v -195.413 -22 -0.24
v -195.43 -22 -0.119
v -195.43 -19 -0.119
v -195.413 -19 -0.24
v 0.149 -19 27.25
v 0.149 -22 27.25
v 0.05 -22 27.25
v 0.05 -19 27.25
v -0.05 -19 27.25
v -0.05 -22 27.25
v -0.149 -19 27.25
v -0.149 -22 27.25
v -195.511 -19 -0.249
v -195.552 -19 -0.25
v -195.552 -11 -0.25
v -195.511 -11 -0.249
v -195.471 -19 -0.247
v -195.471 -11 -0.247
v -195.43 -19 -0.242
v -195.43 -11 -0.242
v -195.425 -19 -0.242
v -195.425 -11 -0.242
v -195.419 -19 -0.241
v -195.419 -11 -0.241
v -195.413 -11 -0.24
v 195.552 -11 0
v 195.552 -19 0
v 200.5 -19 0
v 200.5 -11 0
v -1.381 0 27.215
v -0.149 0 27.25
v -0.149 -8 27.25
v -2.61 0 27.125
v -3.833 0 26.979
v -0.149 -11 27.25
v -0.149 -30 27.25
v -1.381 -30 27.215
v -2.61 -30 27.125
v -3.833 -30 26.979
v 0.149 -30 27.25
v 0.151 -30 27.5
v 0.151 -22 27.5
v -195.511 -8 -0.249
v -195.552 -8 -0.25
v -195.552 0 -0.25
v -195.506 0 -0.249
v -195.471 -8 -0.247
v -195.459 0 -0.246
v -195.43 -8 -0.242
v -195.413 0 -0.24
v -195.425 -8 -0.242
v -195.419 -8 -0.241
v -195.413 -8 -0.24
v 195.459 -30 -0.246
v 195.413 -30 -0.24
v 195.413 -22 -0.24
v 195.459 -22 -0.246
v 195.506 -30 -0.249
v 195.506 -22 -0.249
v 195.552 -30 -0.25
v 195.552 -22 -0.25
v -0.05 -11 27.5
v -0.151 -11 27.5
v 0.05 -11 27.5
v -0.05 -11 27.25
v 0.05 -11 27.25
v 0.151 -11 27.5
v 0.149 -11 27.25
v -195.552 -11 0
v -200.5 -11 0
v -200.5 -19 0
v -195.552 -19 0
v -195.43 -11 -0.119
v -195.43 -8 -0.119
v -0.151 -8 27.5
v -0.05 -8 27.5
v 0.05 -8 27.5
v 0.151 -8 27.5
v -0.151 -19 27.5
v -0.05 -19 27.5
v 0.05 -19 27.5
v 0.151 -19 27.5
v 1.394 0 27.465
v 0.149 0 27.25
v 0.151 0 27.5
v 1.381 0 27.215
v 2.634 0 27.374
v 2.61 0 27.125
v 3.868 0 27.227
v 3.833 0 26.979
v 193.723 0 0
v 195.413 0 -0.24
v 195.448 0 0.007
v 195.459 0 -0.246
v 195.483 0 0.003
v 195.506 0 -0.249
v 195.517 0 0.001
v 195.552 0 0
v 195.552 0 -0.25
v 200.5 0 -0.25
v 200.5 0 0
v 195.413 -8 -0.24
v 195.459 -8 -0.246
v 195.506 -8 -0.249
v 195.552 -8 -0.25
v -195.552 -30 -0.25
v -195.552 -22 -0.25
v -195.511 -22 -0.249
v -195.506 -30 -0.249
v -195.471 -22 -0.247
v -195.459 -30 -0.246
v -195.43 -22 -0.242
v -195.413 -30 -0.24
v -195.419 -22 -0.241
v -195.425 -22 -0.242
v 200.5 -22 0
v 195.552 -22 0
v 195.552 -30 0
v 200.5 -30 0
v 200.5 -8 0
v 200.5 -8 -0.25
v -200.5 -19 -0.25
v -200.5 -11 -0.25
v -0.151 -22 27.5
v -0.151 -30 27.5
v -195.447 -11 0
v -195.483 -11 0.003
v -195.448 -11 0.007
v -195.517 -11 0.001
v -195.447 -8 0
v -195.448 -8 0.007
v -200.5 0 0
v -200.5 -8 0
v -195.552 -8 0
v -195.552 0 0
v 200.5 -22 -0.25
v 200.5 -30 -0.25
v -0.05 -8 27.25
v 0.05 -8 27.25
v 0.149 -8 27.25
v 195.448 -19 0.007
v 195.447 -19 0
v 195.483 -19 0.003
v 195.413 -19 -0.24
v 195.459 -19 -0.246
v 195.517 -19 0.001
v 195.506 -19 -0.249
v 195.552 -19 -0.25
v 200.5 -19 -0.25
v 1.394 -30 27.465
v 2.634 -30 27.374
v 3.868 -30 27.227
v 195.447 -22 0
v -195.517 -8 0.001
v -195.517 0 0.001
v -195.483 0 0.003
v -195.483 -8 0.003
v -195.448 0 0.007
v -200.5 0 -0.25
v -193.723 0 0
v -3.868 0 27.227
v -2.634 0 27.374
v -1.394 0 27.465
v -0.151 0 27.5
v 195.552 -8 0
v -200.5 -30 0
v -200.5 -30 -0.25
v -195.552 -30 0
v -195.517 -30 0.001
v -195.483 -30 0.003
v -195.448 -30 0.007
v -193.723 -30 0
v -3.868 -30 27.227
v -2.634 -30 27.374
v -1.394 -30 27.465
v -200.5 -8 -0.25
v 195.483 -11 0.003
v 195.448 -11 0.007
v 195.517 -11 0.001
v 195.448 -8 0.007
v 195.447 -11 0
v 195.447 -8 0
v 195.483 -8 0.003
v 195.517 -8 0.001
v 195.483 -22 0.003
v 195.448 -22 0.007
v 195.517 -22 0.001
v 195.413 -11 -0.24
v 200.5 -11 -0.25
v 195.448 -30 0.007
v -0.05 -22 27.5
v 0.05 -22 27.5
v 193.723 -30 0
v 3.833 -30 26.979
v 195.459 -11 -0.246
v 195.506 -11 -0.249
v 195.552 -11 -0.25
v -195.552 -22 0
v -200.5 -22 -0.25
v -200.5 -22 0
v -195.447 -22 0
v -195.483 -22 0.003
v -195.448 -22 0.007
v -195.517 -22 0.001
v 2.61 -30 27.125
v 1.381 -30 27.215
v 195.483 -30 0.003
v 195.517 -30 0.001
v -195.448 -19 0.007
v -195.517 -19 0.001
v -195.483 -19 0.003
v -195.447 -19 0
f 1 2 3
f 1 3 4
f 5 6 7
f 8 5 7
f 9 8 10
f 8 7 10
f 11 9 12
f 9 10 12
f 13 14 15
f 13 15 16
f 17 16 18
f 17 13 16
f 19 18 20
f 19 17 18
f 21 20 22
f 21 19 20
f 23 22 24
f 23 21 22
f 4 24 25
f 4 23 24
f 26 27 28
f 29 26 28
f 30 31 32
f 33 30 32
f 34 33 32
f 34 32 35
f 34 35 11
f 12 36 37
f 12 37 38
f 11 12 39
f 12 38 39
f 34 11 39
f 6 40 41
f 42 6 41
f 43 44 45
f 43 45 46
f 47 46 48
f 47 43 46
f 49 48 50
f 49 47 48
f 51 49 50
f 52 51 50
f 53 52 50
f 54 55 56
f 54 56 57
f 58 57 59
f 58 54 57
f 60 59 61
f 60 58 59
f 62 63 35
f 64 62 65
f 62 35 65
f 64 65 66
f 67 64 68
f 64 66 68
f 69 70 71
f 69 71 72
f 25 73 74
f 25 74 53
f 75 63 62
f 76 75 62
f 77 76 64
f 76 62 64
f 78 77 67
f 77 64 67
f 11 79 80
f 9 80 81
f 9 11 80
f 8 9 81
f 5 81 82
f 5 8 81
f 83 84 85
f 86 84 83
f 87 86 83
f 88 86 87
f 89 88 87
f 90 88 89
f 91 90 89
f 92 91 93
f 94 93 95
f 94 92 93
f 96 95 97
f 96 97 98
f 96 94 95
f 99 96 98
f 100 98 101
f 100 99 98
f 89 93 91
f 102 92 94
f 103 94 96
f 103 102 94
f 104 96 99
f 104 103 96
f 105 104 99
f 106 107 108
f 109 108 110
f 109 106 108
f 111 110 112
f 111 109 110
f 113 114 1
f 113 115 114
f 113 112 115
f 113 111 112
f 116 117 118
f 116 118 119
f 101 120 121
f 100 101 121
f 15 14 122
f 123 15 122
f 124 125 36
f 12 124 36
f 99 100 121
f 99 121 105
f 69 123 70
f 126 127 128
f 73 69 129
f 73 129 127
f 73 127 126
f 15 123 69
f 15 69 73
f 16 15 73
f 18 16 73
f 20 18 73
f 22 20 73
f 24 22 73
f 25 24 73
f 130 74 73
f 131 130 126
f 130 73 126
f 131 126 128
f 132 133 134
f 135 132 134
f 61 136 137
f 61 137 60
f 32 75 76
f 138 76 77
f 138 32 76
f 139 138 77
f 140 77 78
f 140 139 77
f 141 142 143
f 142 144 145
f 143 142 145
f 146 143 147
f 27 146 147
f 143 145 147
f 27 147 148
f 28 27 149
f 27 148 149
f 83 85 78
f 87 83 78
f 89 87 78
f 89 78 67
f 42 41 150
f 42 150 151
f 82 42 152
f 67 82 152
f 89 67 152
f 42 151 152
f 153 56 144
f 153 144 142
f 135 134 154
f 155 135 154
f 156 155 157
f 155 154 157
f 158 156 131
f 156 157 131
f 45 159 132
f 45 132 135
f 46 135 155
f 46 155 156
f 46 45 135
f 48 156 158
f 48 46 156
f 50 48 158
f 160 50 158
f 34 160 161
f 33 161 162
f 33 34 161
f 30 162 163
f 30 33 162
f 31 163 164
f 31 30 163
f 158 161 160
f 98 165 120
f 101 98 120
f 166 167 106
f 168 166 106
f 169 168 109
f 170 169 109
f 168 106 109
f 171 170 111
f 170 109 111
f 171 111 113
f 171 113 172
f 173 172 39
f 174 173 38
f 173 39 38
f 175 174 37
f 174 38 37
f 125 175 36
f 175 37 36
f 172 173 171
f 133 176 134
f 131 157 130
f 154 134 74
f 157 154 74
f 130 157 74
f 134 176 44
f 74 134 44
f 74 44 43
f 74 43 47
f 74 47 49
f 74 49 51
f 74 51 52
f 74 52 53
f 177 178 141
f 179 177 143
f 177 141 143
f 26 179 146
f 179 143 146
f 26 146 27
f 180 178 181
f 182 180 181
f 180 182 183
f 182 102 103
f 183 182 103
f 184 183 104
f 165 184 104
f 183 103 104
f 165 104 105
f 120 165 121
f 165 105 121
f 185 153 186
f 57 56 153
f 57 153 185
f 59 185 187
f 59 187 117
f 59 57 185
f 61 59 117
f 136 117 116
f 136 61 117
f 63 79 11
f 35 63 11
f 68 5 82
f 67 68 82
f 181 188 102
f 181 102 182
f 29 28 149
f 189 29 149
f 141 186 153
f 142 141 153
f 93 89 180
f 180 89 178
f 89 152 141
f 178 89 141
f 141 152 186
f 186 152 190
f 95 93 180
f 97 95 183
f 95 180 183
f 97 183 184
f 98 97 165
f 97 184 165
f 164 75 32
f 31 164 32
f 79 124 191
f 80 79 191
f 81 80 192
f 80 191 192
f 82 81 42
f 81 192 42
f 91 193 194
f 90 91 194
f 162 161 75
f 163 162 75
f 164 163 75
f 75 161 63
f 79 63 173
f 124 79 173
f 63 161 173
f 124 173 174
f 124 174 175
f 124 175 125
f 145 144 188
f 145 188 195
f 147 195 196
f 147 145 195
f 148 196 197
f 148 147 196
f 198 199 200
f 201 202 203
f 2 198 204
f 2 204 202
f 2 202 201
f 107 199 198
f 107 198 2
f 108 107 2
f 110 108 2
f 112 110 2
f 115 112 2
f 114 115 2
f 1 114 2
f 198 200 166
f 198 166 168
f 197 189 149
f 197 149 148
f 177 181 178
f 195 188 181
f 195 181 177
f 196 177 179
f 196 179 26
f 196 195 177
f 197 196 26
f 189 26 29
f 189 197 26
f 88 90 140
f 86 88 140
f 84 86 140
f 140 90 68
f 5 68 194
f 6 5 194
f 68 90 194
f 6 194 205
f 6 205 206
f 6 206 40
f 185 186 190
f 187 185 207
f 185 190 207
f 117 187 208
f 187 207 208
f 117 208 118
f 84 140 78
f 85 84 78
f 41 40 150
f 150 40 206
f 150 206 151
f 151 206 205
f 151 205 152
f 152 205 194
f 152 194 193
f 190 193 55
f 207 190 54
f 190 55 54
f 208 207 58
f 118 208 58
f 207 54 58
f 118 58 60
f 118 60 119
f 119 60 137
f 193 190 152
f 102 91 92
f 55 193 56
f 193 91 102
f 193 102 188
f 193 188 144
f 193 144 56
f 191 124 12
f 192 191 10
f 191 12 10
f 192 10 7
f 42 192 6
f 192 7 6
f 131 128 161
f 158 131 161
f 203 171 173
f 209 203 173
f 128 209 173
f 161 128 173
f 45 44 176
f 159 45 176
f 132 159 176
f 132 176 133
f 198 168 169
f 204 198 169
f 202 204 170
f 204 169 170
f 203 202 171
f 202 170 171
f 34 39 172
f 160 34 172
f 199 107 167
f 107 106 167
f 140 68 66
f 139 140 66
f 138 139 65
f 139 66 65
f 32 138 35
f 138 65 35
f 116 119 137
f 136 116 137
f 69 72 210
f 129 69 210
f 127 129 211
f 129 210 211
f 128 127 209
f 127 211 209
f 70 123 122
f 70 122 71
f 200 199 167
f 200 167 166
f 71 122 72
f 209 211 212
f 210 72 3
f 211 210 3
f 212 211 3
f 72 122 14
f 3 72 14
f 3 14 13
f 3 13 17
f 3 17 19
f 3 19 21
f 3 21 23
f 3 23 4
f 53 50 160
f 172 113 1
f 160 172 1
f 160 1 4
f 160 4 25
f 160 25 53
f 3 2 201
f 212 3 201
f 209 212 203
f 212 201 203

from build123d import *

# Parameters (mm, degrees)
BASE_FLANGE1_DEPTH  = 50
UNFOLD1_START       = -50
UNFOLD1_DEPTH       = 50
UNFOLD1_2_OUTLINE_W = 3.874357202
UNFOLD1_2_OUTLINE_H = 0.25
UNFOLD1_2_DEPTH     = 50
CUT_EXTRUDE2_DEPTH  = 211.401854511
SKETCH6_W           = 5.069534468
SKETCH6_H           = 3
CUT_EXTRUDE3_DEPTH  = 211.401854511
LPATTERN2_COUNT     = 2
LPATTERN2_PITCH     = 11
SKETCH8_W           = 0.3
SKETCH8_H           = 8
CUT_EXTRUDE4_DEPTH  = 211.401854511
LPATTERN3_COUNT     = 5
LPATTERN3_PITCH     = 11
SKETCH9_W           = 404.874357202
SKETCH9_H           = 46.767764052
CUT_EXTRUDE5_DEPTH  = 211.398245103
FOLD1_START         = -30
FOLD1_OUTLINE_W     = 3.874357202
FOLD1_OUTLINE_H     = 0.25
FOLD1_DEPTH         = 30
FOLD1_START_2       = -22
FOLD1_2_DEPTH       = 3
FOLD1_START_3       = -11
FOLD1_3_DEPTH       = 3
FOLD1_4_DEPTH       = 30
FOLD1_5_DEPTH       = 3
FOLD1_6_DEPTH       = 3
FOLD1_7_DEPTH       = 8
FOLD1_START_4       = -19
FOLD1_8_DEPTH       = 8
FOLD1_START_5       = -8
FOLD1_9_DEPTH       = 8


# Read off the part's stored shape, not the designer's step: Unfold1, Fold1
# Sheet-metal steps are written as plain solids
with BuildPart() as part:
    # Sketch1 → Base-Flange1 (new body)
    with BuildSketch(Plane(origin=(0, 0, 0), x_dir=(1, 0, 0), z_dir=(0, 1, 0))):
        with BuildLine():
            Line((-200.5, 0), (-195.552065744, 0))
            ThreePointArc((-195.552065744, 0), (-195.50012958, -0.001833238), (-195.448451933, -0.007323826))
            Line((-195.448451933, -0.007323826), (-3.868286445, -27.226574518))
            ThreePointArc((-3.868286445, -27.226574518), (0, -27.5), (3.868286445, -27.226574518))
            Line((3.868286445, -27.226574518), (195.448451933, -0.007323826))
            ThreePointArc((195.448451933, -0.007323826), (195.50012958, -0.001833238), (195.552065744, 0))
            Line((195.552065744, 0), (200.5, 0))
            Line((200.5, 0), (200.5, 0.25))
            Line((200.5, 0.25), (195.552065744, 0.25))
            ThreePointArc((195.552065744, 0.25), (195.48250259, 0.247544566), (195.413285693, 0.240190488))
            Line((195.413285692, 0.240190488), (3.833120205, -26.979060204))
            ThreePointArc((3.833120205, -26.979060204), (0, -27.25), (-3.833120205, -26.979060204))
            Line((-3.833120205, -26.979060204), (-195.413285692, 0.240190488))
            ThreePointArc((-195.413285692, 0.240190488), (-195.48250259, 0.247544566), (-195.552065743, 0.25))
            Line((-195.552065744, 0.25), (-200.5, 0.25))
            Line((-200.5, 0.25), (-200.5, 0))
        make_face()
    extrude(amount=-BASE_FLANGE1_DEPTH)

    # Unfold1 outline → Unfold1 (cut)
    with BuildSketch(Plane(origin=(0, 0, 0), x_dir=(1, 0, 0), z_dir=(0, 1, 0)).offset(UNFOLD1_START)):
        with BuildLine():
            Line((195.552065744, 0), (193.722727272, 0))
            Line((193.722727272, 0), (3.833120205, -26.979060204))
            ThreePointArc((3.833120205, -26.979060204), (0, -27.25), (-3.833120205, -26.979060204))
            Line((-3.833120205, -26.979060204), (-193.722727272, 0))
            Line((-193.722727272, 0), (-195.552065744, 0))
            ThreePointArc((-195.552065744, 0), (-195.500129581, -0.001833238), (-195.448451933, -0.007323826))
            Line((-195.448451933, -0.007323826), (-3.868286445, -27.226574518))
            ThreePointArc((-3.868286445, -27.226574518), (0, -27.5), (3.868286445, -27.226574518))
            Line((3.868286445, -27.226574518), (195.448451933, -0.007323826))
            ThreePointArc((195.448451933, -0.007323826), (195.500129581, -0.001833238), (195.552065744, 0))
        make_face()
    extrude(amount=UNFOLD1_DEPTH, mode=Mode.SUBTRACT)

    # Unfold1 2 outline → Unfold1 2 (add)
    with BuildSketch(Plane(origin=(0, 0, 0), x_dir=(1, 0, 0), z_dir=(0, 1, 0)).offset(UNFOLD1_START)):
        with BuildLine():
            ThreePointArc((195.413285692, 0.240190488), (195.48250259, 0.247544566), (195.552065744, 0.25))
            Line((195.552065744, 0.25), (-195.552065744, 0.25))
            ThreePointArc((-195.552065744, 0.25), (-195.48250259, 0.247544566), (-195.413285692, 0.240190488))
            Line((-195.413285692, 0.240190488), (-193.722727272, 0))
            Line((-193.722727272, 0), (193.722727272, 0))
            Line((193.722727272, 0), (195.413285692, 0.240190488))
        make_face()
        with Locations((202.437178601, 0.125)):
            Rectangle(UNFOLD1_2_OUTLINE_W, UNFOLD1_2_OUTLINE_H)
    extrude(amount=UNFOLD1_2_DEPTH)

    # Sketch7 → Cut-Extrude2 (cut, through all)
    with BuildSketch(Plane.XY):
        Polygon((-200.5, -30), (-195.552065744, -30), (1.937178601, -50), (199.304822734, -30), (204.374357202, -30), (227.072555567, -34.066984848), (175.364463115, -76.287353915), (-151.111703925, -76.287353915), (-215.740676819, -64.707357595), align=None)
    extrude(amount=-CUT_EXTRUDE2_DEPTH, mode=Mode.SUBTRACT)

    # Sketch6 → Cut-Extrude3 (cut, through all)
    with BuildSketch(Plane.XY):
        with Locations((-197.965232766, -9.5)):
            Rectangle(SKETCH6_W, SKETCH6_H)
        with Locations((201.839589968, -9.5)):
            Rectangle(SKETCH6_W, SKETCH6_H)
    cut_extrude3 = extrude(amount=-CUT_EXTRUDE3_DEPTH, mode=Mode.SUBTRACT)

    # LPattern2: Cut-Extrude3 ×2
    with Locations(*[(0, -i * LPATTERN2_PITCH, 0) for i in range(1, LPATTERN2_COUNT)]):
        add(cut_extrude3, mode=Mode.SUBTRACT)

    # Sketch8 → Cut-Extrude4 (cut, through all)
    with BuildSketch(Plane.XY):
        with Locations((1.937178601, -4)):
            Rectangle(SKETCH8_W, SKETCH8_H)
    cut_extrude4 = extrude(amount=-CUT_EXTRUDE4_DEPTH, mode=Mode.SUBTRACT)

    # LPattern3: Cut-Extrude4 ×5
    with Locations(*[(0, -i * LPATTERN3_PITCH, 0) for i in range(1, LPATTERN3_COUNT)]):
        add(cut_extrude4, mode=Mode.SUBTRACT)

    # Sketch9 → Cut-Extrude5 (cut, through all)
    with BuildSketch(Plane.XY):
        with Locations((1.937178601, -53.383882026)):
            Rectangle(SKETCH9_W, SKETCH9_H)
    extrude(amount=-CUT_EXTRUDE5_DEPTH, mode=Mode.SUBTRACT)

    # Fold1 outline → Fold1 (cut)
    with BuildSketch(Plane(origin=(0, 0, 0), x_dir=(1, 0, 0), z_dir=(0, 1, 0)).offset(FOLD1_START)):
        with BuildLine():
            Line((193.722727272, 0), (195.413285692, 0.240190488))
            ThreePointArc((195.413285692, 0.240190488), (195.48250259, 0.247544566), (195.552065744, 0.25))
            Line((195.552065744, 0.25), (-195.552065744, 0.25))
            ThreePointArc((-195.552065744, 0.25), (-195.48250259, 0.247544566), (-195.413285692, 0.240190488))
            Line((-195.413285692, 0.240190488), (-193.722727272, 0))
            Line((-193.722727272, 0), (193.722727272, 0))
        make_face()
        with Locations((202.437178601, 0.125)):
            Rectangle(FOLD1_OUTLINE_W, FOLD1_OUTLINE_H)
    extrude(amount=FOLD1_DEPTH, mode=Mode.SUBTRACT)

    # Fold1 2 outline → Fold1 2 (cut)
    with BuildSketch(Plane(origin=(0, 0, 0), x_dir=(1, 0, 0), z_dir=(0, 1, 0)).offset(FOLD1_START_2)):
        with BuildLine():
            ThreePointArc((195.552065744, 0.25), (195.48250259, 0.247544566), (195.413285692, 0.240190488))
            Line((195.413285692, 0.240190488), (195.447411381, 0))
            Line((195.447411381, 0), (199.304822734, 0))
            Line((199.304822734, 0), (199.304822734, 0.25))
            Line((199.304822734, 0.25), (195.552065744, 0.25))
        make_face()
        with BuildLine():
            Line((-195.430465532, 0.119271783), (-195.413285692, 0.240190488))
            ThreePointArc((-195.413285692, 0.240190488), (-195.42187059, 0.241371769), (-195.430465532, 0.242477601))
            Line((-195.430465532, 0.242477601), (-195.430465532, 0.119271783))
        make_face()
    extrude(amount=FOLD1_2_DEPTH, mode=Mode.SUBTRACT)

    # Fold1 3 outline → Fold1 3 (cut)
    with BuildSketch(Plane(origin=(0, 0, 0), x_dir=(1, 0, 0), z_dir=(0, 1, 0)).offset(FOLD1_START_3)):
        with BuildLine():
            ThreePointArc((195.552065744, 0.25), (195.48250259, 0.247544566), (195.413285692, 0.240190488))
            Line((195.413285692, 0.240190488), (195.447411381, 0))
            Line((195.447411381, 0), (199.304822734, 0))
            Line((199.304822734, 0), (199.304822734, 0.25))
            Line((199.304822734, 0.25), (195.552065744, 0.25))
        make_face()
        with BuildLine():
            Line((-195.430465532, 0.119271783), (-195.413285692, 0.240190488))
            ThreePointArc((-195.413285692, 0.240190488), (-195.42187059, 0.241371769), (-195.430465532, 0.242477601))
            Line((-195.430465532, 0.242477601), (-195.430465532, 0.119271783))
        make_face()
    extrude(amount=FOLD1_3_DEPTH, mode=Mode.SUBTRACT)

    # Fold1 4 outline → Fold1 4 (add)
    with BuildSketch(Plane(origin=(0, 0, 0), x_dir=(1, 0, 0), z_dir=(0, 1, 0)).offset(FOLD1_START)):
        with BuildLine():
            Line((195.447411381, 0), (193.722727272, 0))
            Line((193.722727272, 0), (3.833120205, -26.979060204))
            ThreePointArc((3.833120205, -26.979060204), (1.99580633, -27.176814697), (0.149314321, -27.249590919))
            Line((0.149314321, -27.249590919), (0.150684177, -27.499587166))
            ThreePointArc((0.150684177, -27.499587166), (2.014116479, -27.426143273), (3.868286445, -27.226574518))
            Line((3.868286445, -27.226574518), (195.448451933, -0.007323826))
            Line((195.448451933, -0.007323826), (195.447411381, 0))
        make_face()
        with BuildLine():
            Line((-0.150684177, -27.499587166), (-0.149314321, -27.249590919))
            ThreePointArc((-0.149314321, -27.249590919), (-1.99580633, -27.176814697), (-3.833120205, -26.979060204))
            Line((-3.833120205, -26.979060204), (-193.722727272, 0))
            Line((-193.722727272, 0), (-195.430465532, 0))
            Line((-195.430465532, 0), (-195.430465532, 0.119271783))
            Line((-195.430465532, 0.119271783), (-195.448451933, -0.007323826))
            Line((-195.448451933, -0.007323826), (-3.868286445, -27.226574518))
            ThreePointArc((-3.868286445, -27.226574518), (-2.014116479, -27.426143273), (-0.150684177, -27.499587166))
        make_face()
    extrude(amount=FOLD1_4_DEPTH)

    # Fold1 5 outline → Fold1 5 (add)
    with BuildSketch(Plane(origin=(0, 0, 0), x_dir=(1, 0, 0), z_dir=(0, 1, 0)).offset(FOLD1_START_2)):
        with BuildLine():
            Line((0.150684177, -27.499587166), (0.149314321, -27.249590919))
            ThreePointArc((0.149314321, -27.249590919), (0, -27.25), (-0.149314321, -27.249590919))
            Line((-0.149314321, -27.249590919), (-0.150684177, -27.499587166))
            ThreePointArc((-0.150684177, -27.499587166), (0, -27.5), (0.150684177, -27.499587166))
        make_face()
    extrude(amount=FOLD1_5_DEPTH)

    # Fold1 6 outline → Fold1 6 (add)
    with BuildSketch(Plane(origin=(0, 0, 0), x_dir=(1, 0, 0), z_dir=(0, 1, 0)).offset(FOLD1_START_3)):
        with BuildLine():
            Line((0.150684177, -27.499587166), (0.149314321, -27.249590919))
            ThreePointArc((0.149314321, -27.249590919), (0, -27.25), (-0.149314321, -27.249590919))
            Line((-0.149314321, -27.249590919), (-0.150684177, -27.499587166))
            ThreePointArc((-0.150684177, -27.499587166), (0, -27.5), (0.150684177, -27.499587166))
        make_face()
    extrude(amount=FOLD1_6_DEPTH)

    # Fold1 7 outline → Fold1 7 (add)
    with BuildSketch(Plane(origin=(0, 0, 0), x_dir=(1, 0, 0), z_dir=(0, 1, 0)).offset(FOLD1_START)):
        with BuildLine():
            Line((195.552065744, 0), (195.447411381, 0))
            Line((195.447411381, 0), (195.448451933, -0.007323826))
            ThreePointArc((195.448451933, -0.007323826), (195.500129581, -0.001833238), (195.552065744, 0))
        make_face()
        with BuildLine():
            ThreePointArc((-195.552065744, 0), (-195.500129581, -0.001833238), (-195.448451933, -0.007323826))
            Line((-195.448451933, -0.007323826), (-195.447411381, 0))
            Line((-195.447411381, 0), (-195.552065744, 0))
        make_face()
    extrude(amount=FOLD1_7_DEPTH)

    # Fold1 8 outline → Fold1 8 (add)
    with BuildSketch(Plane(origin=(0, 0, 0), x_dir=(1, 0, 0), z_dir=(0, 1, 0)).offset(FOLD1_START_4)):
        with BuildLine():
            Line((195.552065744, 0), (195.447411381, 0))
            Line((195.447411381, 0), (195.448451933, -0.007323826))
            ThreePointArc((195.448451933, -0.007323826), (195.500129581, -0.001833238), (195.552065744, 0))
        make_face()
        with BuildLine():
            ThreePointArc((-195.552065744, 0), (-195.500129581, -0.001833238), (-195.448451933, -0.007323826))
            Line((-195.448451933, -0.007323826), (-195.447411381, 0))
            Line((-195.447411381, 0), (-195.552065744, 0))
        make_face()
    extrude(amount=FOLD1_8_DEPTH)

    # Fold1 9 outline → Fold1 9 (add)
    with BuildSketch(Plane(origin=(0, 0, 0), x_dir=(1, 0, 0), z_dir=(0, 1, 0)).offset(FOLD1_START_5)):
        with BuildLine():
            Line((195.552065744, 0), (195.447411381, 0))
            Line((195.447411381, 0), (195.448451933, -0.007323826))
            ThreePointArc((195.448451933, -0.007323826), (195.500129581, -0.001833238), (195.552065744, 0))
        make_face()
        with BuildLine():
            ThreePointArc((-195.552065744, 0), (-195.500129581, -0.001833238), (-195.448451933, -0.007323826))
            Line((-195.448451933, -0.007323826), (-195.447411381, 0))
            Line((-195.447411381, 0), (-195.552065744, 0))
        make_face()
    extrude(amount=FOLD1_9_DEPTH)


solid = part.part
